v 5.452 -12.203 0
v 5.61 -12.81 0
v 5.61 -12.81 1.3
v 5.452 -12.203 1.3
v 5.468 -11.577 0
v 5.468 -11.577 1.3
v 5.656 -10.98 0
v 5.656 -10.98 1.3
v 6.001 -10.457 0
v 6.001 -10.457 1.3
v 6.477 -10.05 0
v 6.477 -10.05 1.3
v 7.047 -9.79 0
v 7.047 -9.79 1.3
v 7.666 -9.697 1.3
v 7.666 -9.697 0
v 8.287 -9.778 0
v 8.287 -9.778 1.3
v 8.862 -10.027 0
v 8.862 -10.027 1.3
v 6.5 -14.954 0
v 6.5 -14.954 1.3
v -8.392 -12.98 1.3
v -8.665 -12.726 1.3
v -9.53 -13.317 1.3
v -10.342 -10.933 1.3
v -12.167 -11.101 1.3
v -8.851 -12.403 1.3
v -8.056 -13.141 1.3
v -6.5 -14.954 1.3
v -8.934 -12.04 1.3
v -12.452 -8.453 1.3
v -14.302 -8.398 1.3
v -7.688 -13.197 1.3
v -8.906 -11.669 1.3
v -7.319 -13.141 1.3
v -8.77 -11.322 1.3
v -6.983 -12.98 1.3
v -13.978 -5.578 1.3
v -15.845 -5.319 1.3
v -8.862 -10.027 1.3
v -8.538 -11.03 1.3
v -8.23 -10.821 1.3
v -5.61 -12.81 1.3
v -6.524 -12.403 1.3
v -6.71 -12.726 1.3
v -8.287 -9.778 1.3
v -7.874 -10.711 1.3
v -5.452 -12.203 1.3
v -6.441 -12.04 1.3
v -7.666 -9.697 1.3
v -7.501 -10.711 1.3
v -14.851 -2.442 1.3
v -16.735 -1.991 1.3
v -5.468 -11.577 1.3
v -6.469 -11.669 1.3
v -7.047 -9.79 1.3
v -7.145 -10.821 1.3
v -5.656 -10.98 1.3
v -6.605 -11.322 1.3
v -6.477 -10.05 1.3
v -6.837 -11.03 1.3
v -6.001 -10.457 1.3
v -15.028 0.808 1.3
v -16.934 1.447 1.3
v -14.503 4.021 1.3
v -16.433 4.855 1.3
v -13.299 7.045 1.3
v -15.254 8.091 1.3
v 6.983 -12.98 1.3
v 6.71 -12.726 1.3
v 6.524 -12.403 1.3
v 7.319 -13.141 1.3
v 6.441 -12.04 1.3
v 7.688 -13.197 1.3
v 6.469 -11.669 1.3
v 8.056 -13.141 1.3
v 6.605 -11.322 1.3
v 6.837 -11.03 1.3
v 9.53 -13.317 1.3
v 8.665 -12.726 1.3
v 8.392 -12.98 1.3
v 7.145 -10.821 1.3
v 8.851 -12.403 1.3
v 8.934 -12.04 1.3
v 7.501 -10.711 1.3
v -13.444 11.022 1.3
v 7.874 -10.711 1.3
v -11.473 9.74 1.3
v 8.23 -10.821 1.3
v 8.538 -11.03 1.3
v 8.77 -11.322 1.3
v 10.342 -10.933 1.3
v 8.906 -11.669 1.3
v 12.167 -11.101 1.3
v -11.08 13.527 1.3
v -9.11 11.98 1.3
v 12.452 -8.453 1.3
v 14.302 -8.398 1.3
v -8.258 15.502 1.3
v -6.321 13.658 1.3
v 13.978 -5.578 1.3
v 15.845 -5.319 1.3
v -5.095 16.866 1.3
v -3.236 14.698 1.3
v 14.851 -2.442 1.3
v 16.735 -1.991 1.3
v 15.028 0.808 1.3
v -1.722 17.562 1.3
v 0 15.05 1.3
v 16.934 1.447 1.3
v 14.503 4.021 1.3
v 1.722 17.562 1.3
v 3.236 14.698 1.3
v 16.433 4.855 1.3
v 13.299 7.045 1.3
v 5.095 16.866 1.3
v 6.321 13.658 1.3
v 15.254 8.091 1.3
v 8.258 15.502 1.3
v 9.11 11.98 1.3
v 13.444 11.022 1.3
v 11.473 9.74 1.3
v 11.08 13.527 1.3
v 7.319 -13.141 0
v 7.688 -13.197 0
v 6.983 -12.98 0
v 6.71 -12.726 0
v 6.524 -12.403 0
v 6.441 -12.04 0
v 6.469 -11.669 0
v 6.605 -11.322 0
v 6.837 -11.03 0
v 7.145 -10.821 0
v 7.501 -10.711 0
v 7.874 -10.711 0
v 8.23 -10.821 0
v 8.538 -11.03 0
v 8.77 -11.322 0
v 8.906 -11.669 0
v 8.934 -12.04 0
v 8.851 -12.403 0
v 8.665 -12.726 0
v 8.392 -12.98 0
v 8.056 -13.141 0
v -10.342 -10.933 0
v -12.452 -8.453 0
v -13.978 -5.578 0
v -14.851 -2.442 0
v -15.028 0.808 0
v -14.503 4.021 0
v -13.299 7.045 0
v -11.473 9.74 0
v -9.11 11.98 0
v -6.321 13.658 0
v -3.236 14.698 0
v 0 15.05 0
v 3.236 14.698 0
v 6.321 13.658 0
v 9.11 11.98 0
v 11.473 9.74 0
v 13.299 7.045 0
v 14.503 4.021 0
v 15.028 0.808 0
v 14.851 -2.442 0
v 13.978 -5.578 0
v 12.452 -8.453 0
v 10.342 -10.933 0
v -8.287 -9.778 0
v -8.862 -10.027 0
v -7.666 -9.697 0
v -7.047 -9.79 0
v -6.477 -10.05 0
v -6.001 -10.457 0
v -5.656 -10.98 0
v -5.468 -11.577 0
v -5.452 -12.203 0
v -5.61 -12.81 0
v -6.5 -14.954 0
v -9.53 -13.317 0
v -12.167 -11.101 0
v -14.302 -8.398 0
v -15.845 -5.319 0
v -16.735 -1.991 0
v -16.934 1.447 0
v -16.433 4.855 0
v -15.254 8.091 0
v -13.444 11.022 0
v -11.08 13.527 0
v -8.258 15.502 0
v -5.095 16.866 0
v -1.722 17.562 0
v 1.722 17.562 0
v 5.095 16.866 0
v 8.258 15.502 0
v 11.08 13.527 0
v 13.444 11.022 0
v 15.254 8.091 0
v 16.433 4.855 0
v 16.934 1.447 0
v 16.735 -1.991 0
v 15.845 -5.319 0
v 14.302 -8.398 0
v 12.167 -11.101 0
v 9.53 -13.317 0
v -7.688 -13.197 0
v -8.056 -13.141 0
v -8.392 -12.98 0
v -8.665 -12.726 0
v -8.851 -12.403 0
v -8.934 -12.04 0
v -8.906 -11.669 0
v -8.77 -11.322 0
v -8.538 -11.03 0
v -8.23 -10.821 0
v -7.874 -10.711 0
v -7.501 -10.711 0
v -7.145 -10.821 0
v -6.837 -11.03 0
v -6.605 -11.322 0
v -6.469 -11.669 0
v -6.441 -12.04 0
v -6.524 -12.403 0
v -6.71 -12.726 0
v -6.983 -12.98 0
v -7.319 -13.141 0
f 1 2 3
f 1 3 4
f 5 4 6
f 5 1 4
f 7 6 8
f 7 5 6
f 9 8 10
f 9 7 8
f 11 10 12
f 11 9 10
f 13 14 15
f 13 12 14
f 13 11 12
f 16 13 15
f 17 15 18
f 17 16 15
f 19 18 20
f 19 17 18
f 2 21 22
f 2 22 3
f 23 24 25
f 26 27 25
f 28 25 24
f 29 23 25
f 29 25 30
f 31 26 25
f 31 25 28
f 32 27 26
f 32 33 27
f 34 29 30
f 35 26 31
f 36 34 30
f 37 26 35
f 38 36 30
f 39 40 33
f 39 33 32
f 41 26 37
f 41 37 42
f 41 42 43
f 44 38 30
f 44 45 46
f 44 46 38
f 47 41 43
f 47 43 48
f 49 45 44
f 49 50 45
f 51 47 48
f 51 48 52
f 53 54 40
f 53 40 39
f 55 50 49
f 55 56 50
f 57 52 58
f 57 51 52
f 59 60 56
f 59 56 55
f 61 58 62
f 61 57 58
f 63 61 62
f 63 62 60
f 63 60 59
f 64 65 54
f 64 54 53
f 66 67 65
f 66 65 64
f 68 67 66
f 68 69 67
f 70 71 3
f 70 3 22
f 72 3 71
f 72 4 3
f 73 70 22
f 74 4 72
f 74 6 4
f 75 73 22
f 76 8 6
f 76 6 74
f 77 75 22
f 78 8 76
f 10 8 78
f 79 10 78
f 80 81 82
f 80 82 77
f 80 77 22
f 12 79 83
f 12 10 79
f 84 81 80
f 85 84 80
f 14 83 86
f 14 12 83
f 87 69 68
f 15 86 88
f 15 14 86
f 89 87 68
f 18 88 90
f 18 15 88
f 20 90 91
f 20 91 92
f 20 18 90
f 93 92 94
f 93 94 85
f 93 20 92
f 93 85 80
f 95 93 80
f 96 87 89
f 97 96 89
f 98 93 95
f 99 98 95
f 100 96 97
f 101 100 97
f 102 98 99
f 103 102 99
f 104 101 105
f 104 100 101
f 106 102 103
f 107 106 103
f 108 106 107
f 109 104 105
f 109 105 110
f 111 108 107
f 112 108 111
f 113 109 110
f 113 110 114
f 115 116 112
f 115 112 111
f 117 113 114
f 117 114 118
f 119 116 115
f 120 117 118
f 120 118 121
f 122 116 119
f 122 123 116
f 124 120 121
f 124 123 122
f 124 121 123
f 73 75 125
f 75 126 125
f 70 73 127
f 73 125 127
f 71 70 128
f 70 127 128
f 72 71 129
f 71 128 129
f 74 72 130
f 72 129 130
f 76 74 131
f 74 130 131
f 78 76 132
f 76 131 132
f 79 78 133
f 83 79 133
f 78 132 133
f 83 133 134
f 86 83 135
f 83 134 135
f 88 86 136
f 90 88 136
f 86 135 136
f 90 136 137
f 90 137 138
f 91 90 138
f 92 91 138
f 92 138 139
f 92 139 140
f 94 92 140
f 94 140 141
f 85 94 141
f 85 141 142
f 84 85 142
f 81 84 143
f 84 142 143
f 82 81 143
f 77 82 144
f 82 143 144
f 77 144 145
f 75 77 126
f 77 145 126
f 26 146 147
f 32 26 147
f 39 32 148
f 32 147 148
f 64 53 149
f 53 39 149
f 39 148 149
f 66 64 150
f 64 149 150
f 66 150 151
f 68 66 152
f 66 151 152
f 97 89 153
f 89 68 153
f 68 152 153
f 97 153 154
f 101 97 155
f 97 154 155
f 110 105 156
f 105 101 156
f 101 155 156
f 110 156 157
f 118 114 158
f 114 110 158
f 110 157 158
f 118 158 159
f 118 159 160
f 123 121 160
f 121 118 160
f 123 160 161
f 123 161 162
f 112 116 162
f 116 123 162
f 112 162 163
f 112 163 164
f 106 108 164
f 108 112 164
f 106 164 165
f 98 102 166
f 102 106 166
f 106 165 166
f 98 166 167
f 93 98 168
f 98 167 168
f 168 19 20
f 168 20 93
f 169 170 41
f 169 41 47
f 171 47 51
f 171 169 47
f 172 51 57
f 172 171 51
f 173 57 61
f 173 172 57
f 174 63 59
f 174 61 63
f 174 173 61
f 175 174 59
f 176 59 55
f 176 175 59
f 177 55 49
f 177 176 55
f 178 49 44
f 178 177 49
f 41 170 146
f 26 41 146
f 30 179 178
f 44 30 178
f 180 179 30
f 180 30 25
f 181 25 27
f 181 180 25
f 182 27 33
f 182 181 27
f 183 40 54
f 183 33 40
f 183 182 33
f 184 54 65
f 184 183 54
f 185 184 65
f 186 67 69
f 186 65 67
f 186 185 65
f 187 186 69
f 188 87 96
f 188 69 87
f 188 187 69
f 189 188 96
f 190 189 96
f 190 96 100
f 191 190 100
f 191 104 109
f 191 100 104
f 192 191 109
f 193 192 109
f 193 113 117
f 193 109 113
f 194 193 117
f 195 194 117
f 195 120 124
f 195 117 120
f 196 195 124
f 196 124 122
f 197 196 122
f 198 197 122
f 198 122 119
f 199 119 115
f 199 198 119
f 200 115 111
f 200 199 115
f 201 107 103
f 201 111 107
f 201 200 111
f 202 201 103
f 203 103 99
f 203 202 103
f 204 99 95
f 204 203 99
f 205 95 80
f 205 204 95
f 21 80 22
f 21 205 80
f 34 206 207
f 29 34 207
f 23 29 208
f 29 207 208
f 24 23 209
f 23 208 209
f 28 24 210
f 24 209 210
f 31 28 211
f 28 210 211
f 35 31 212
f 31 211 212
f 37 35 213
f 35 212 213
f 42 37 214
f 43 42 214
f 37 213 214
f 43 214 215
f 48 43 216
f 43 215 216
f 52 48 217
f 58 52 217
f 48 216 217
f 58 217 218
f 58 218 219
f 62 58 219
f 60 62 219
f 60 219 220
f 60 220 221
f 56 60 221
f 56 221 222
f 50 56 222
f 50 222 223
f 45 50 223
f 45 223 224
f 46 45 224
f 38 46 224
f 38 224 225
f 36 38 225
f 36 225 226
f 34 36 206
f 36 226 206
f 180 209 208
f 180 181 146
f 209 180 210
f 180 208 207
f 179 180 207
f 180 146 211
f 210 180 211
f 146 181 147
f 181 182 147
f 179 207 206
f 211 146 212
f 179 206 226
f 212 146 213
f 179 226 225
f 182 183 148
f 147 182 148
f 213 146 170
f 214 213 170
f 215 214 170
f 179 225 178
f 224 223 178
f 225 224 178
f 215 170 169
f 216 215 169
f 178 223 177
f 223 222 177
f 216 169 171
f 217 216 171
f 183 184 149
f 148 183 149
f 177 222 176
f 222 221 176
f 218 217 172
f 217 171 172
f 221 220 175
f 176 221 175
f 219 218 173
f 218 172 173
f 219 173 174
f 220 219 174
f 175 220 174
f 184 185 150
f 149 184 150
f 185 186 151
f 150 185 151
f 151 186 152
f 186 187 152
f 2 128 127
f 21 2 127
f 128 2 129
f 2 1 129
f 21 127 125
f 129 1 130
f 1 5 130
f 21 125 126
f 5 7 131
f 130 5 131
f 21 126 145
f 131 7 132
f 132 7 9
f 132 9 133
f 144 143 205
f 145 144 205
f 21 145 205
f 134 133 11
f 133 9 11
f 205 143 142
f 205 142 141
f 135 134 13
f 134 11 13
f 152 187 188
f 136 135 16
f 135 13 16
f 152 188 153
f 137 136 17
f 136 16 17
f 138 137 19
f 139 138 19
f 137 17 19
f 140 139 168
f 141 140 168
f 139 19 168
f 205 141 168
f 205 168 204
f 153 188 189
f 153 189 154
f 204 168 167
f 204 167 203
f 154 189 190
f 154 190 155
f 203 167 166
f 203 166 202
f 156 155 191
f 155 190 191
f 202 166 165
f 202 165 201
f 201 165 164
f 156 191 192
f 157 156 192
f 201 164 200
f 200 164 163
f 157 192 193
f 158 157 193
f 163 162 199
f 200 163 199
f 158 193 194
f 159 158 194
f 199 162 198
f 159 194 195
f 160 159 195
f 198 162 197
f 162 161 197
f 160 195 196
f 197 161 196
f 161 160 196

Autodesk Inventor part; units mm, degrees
ref_plane "WorkPlane1" through (0, 0, 0) normal (0, 0, 1) x (1, 0, 0)
ref_plane "Work Plane2" through (0, 0, -1.3) normal (0, 0, 1) x (1, 0, 0)
ref_plane "WorkPlane2" through (0, 0, 1) normal (0, 0, 1) x (1, 0, 0)
sketch "Szkic1" plane through (0, 0, 0) normal (0, 0, 1) x (1, 0, 0)
  point P0 (0, 0)
sketch "Szkic2" plane through (0, 0, 0) normal (0, 0, 1) x (1, 0, 0)
  line L0 (6.5, -14.9542) -> (5.6095, -12.8096)
  arc A0 (8.8615, -10.0274) -> (5.6095, -12.8096) centre (7.6875, -11.9468) ccw
  line L1 (8.8615, -10.0274) -> (10.3425, -10.9332)
  arc A1 (10.3425, -10.9332) -> (-10.3425, -10.9332) centre (0, 0) ccw
  line L2 (-8.8615, -10.0274) -> (-10.3425, -10.9332)
  arc A2 (-5.6095, -12.8096) -> (-8.8615, -10.0274) centre (-7.6875, -11.9468) ccw
  line L3 (-6.5, -14.9542) -> (-5.6095, -12.8096)
  arc A3 (6.5, -14.9542) -> (-6.5, -14.9542) centre (0, 0.7) ccw
  line L4 (0, 0.7) -> (-6.5, -14.9542) construction
  line L5 (0, 0.7) -> (6.5, -14.9542) construction
  dimension "d2" = 16.95
  dimension "d4" = 0
  dimension "d6" = 15.05
  dimension "d8" = 0.7
  dimension "d10" = 6.5
  dimension "d12" = 6.5
  dimension "d14" = 2.25
  dimension "d16" = 2.25
  dimension "d18" = 14.8
  dimension "d20" = 14.8
  dimension "d22" = 36
  dimension "d24" = 36
extrude "Wyciągnięcie proste1" add sketch "Szkic2" along normal blind 1.3
sketch "Szkic3" plane through (0, 0, 1.3) normal (0, 0, 1) x (1, 0, 0)
  arc A0 (-5.6095, -12.8096) -> (-8.8615, -10.0274) centre (-7.6875, -11.9468) ccw projected
hole "Otwór1" at (-7.6875, -11.9468, 1.3) direction (0, 0, -1) diameter 2.5 end through all
sketch "Szkic4" plane through (0, 0, 1.3) normal (0, 0, 1) x (1, 0, 0)
  arc A0 (8.8615, -10.0274) -> (5.6095, -12.8096) centre (7.6875, -11.9468) ccw projected
hole "Otwór2" at (7.6875, -11.9468, 1.3) direction (0, 0, -1) diameter 2.5 end through all
equation "\"d2\" = 0.5 * Diam2"
equation "\"d6\" = 0.5 * msp_dd1"
equation "\"d8\" = -0.5 * msp_dd1 + 0.5 * Diam2 - 0.222222 * ParA"
equation "\"d10\" = 2.6 * Diam5"
equation "\"d12\" = 2.6 * Diam5"
equation "\"d14\" = 0.9 * Diam5"
equation "\"d16\" = 0.9 * Diam5"
equation "\"d18\" = 1.3 * Diam5 + 0.5 * Diam2 - ParA"
equation "\"d20\" = 1.3 * Diam5 + 0.5 * Diam2 - ParA"
equation "\"d25\" = ParS"
equation "\"d29\" = Diam5"
equation "\"d36\" = Diam5"
equation "\"Diam5\" = 2.5"
equation "\"ParA\" = 5.4"
equation "\"ParS\" = 1.3"
equation "\"Diam2\" = 33.9"
equation "\"msp_dd1\" = -b + Diam2 - 0.111111 * ParA"
equation "\"msp_pom\" = 0.5 * Diam2 - b"
equation "\"TEMPLATE\" = 1.2345"
properties part number "ANSI B 27.7M - 3BMI-32" material "Stal, miękka"
